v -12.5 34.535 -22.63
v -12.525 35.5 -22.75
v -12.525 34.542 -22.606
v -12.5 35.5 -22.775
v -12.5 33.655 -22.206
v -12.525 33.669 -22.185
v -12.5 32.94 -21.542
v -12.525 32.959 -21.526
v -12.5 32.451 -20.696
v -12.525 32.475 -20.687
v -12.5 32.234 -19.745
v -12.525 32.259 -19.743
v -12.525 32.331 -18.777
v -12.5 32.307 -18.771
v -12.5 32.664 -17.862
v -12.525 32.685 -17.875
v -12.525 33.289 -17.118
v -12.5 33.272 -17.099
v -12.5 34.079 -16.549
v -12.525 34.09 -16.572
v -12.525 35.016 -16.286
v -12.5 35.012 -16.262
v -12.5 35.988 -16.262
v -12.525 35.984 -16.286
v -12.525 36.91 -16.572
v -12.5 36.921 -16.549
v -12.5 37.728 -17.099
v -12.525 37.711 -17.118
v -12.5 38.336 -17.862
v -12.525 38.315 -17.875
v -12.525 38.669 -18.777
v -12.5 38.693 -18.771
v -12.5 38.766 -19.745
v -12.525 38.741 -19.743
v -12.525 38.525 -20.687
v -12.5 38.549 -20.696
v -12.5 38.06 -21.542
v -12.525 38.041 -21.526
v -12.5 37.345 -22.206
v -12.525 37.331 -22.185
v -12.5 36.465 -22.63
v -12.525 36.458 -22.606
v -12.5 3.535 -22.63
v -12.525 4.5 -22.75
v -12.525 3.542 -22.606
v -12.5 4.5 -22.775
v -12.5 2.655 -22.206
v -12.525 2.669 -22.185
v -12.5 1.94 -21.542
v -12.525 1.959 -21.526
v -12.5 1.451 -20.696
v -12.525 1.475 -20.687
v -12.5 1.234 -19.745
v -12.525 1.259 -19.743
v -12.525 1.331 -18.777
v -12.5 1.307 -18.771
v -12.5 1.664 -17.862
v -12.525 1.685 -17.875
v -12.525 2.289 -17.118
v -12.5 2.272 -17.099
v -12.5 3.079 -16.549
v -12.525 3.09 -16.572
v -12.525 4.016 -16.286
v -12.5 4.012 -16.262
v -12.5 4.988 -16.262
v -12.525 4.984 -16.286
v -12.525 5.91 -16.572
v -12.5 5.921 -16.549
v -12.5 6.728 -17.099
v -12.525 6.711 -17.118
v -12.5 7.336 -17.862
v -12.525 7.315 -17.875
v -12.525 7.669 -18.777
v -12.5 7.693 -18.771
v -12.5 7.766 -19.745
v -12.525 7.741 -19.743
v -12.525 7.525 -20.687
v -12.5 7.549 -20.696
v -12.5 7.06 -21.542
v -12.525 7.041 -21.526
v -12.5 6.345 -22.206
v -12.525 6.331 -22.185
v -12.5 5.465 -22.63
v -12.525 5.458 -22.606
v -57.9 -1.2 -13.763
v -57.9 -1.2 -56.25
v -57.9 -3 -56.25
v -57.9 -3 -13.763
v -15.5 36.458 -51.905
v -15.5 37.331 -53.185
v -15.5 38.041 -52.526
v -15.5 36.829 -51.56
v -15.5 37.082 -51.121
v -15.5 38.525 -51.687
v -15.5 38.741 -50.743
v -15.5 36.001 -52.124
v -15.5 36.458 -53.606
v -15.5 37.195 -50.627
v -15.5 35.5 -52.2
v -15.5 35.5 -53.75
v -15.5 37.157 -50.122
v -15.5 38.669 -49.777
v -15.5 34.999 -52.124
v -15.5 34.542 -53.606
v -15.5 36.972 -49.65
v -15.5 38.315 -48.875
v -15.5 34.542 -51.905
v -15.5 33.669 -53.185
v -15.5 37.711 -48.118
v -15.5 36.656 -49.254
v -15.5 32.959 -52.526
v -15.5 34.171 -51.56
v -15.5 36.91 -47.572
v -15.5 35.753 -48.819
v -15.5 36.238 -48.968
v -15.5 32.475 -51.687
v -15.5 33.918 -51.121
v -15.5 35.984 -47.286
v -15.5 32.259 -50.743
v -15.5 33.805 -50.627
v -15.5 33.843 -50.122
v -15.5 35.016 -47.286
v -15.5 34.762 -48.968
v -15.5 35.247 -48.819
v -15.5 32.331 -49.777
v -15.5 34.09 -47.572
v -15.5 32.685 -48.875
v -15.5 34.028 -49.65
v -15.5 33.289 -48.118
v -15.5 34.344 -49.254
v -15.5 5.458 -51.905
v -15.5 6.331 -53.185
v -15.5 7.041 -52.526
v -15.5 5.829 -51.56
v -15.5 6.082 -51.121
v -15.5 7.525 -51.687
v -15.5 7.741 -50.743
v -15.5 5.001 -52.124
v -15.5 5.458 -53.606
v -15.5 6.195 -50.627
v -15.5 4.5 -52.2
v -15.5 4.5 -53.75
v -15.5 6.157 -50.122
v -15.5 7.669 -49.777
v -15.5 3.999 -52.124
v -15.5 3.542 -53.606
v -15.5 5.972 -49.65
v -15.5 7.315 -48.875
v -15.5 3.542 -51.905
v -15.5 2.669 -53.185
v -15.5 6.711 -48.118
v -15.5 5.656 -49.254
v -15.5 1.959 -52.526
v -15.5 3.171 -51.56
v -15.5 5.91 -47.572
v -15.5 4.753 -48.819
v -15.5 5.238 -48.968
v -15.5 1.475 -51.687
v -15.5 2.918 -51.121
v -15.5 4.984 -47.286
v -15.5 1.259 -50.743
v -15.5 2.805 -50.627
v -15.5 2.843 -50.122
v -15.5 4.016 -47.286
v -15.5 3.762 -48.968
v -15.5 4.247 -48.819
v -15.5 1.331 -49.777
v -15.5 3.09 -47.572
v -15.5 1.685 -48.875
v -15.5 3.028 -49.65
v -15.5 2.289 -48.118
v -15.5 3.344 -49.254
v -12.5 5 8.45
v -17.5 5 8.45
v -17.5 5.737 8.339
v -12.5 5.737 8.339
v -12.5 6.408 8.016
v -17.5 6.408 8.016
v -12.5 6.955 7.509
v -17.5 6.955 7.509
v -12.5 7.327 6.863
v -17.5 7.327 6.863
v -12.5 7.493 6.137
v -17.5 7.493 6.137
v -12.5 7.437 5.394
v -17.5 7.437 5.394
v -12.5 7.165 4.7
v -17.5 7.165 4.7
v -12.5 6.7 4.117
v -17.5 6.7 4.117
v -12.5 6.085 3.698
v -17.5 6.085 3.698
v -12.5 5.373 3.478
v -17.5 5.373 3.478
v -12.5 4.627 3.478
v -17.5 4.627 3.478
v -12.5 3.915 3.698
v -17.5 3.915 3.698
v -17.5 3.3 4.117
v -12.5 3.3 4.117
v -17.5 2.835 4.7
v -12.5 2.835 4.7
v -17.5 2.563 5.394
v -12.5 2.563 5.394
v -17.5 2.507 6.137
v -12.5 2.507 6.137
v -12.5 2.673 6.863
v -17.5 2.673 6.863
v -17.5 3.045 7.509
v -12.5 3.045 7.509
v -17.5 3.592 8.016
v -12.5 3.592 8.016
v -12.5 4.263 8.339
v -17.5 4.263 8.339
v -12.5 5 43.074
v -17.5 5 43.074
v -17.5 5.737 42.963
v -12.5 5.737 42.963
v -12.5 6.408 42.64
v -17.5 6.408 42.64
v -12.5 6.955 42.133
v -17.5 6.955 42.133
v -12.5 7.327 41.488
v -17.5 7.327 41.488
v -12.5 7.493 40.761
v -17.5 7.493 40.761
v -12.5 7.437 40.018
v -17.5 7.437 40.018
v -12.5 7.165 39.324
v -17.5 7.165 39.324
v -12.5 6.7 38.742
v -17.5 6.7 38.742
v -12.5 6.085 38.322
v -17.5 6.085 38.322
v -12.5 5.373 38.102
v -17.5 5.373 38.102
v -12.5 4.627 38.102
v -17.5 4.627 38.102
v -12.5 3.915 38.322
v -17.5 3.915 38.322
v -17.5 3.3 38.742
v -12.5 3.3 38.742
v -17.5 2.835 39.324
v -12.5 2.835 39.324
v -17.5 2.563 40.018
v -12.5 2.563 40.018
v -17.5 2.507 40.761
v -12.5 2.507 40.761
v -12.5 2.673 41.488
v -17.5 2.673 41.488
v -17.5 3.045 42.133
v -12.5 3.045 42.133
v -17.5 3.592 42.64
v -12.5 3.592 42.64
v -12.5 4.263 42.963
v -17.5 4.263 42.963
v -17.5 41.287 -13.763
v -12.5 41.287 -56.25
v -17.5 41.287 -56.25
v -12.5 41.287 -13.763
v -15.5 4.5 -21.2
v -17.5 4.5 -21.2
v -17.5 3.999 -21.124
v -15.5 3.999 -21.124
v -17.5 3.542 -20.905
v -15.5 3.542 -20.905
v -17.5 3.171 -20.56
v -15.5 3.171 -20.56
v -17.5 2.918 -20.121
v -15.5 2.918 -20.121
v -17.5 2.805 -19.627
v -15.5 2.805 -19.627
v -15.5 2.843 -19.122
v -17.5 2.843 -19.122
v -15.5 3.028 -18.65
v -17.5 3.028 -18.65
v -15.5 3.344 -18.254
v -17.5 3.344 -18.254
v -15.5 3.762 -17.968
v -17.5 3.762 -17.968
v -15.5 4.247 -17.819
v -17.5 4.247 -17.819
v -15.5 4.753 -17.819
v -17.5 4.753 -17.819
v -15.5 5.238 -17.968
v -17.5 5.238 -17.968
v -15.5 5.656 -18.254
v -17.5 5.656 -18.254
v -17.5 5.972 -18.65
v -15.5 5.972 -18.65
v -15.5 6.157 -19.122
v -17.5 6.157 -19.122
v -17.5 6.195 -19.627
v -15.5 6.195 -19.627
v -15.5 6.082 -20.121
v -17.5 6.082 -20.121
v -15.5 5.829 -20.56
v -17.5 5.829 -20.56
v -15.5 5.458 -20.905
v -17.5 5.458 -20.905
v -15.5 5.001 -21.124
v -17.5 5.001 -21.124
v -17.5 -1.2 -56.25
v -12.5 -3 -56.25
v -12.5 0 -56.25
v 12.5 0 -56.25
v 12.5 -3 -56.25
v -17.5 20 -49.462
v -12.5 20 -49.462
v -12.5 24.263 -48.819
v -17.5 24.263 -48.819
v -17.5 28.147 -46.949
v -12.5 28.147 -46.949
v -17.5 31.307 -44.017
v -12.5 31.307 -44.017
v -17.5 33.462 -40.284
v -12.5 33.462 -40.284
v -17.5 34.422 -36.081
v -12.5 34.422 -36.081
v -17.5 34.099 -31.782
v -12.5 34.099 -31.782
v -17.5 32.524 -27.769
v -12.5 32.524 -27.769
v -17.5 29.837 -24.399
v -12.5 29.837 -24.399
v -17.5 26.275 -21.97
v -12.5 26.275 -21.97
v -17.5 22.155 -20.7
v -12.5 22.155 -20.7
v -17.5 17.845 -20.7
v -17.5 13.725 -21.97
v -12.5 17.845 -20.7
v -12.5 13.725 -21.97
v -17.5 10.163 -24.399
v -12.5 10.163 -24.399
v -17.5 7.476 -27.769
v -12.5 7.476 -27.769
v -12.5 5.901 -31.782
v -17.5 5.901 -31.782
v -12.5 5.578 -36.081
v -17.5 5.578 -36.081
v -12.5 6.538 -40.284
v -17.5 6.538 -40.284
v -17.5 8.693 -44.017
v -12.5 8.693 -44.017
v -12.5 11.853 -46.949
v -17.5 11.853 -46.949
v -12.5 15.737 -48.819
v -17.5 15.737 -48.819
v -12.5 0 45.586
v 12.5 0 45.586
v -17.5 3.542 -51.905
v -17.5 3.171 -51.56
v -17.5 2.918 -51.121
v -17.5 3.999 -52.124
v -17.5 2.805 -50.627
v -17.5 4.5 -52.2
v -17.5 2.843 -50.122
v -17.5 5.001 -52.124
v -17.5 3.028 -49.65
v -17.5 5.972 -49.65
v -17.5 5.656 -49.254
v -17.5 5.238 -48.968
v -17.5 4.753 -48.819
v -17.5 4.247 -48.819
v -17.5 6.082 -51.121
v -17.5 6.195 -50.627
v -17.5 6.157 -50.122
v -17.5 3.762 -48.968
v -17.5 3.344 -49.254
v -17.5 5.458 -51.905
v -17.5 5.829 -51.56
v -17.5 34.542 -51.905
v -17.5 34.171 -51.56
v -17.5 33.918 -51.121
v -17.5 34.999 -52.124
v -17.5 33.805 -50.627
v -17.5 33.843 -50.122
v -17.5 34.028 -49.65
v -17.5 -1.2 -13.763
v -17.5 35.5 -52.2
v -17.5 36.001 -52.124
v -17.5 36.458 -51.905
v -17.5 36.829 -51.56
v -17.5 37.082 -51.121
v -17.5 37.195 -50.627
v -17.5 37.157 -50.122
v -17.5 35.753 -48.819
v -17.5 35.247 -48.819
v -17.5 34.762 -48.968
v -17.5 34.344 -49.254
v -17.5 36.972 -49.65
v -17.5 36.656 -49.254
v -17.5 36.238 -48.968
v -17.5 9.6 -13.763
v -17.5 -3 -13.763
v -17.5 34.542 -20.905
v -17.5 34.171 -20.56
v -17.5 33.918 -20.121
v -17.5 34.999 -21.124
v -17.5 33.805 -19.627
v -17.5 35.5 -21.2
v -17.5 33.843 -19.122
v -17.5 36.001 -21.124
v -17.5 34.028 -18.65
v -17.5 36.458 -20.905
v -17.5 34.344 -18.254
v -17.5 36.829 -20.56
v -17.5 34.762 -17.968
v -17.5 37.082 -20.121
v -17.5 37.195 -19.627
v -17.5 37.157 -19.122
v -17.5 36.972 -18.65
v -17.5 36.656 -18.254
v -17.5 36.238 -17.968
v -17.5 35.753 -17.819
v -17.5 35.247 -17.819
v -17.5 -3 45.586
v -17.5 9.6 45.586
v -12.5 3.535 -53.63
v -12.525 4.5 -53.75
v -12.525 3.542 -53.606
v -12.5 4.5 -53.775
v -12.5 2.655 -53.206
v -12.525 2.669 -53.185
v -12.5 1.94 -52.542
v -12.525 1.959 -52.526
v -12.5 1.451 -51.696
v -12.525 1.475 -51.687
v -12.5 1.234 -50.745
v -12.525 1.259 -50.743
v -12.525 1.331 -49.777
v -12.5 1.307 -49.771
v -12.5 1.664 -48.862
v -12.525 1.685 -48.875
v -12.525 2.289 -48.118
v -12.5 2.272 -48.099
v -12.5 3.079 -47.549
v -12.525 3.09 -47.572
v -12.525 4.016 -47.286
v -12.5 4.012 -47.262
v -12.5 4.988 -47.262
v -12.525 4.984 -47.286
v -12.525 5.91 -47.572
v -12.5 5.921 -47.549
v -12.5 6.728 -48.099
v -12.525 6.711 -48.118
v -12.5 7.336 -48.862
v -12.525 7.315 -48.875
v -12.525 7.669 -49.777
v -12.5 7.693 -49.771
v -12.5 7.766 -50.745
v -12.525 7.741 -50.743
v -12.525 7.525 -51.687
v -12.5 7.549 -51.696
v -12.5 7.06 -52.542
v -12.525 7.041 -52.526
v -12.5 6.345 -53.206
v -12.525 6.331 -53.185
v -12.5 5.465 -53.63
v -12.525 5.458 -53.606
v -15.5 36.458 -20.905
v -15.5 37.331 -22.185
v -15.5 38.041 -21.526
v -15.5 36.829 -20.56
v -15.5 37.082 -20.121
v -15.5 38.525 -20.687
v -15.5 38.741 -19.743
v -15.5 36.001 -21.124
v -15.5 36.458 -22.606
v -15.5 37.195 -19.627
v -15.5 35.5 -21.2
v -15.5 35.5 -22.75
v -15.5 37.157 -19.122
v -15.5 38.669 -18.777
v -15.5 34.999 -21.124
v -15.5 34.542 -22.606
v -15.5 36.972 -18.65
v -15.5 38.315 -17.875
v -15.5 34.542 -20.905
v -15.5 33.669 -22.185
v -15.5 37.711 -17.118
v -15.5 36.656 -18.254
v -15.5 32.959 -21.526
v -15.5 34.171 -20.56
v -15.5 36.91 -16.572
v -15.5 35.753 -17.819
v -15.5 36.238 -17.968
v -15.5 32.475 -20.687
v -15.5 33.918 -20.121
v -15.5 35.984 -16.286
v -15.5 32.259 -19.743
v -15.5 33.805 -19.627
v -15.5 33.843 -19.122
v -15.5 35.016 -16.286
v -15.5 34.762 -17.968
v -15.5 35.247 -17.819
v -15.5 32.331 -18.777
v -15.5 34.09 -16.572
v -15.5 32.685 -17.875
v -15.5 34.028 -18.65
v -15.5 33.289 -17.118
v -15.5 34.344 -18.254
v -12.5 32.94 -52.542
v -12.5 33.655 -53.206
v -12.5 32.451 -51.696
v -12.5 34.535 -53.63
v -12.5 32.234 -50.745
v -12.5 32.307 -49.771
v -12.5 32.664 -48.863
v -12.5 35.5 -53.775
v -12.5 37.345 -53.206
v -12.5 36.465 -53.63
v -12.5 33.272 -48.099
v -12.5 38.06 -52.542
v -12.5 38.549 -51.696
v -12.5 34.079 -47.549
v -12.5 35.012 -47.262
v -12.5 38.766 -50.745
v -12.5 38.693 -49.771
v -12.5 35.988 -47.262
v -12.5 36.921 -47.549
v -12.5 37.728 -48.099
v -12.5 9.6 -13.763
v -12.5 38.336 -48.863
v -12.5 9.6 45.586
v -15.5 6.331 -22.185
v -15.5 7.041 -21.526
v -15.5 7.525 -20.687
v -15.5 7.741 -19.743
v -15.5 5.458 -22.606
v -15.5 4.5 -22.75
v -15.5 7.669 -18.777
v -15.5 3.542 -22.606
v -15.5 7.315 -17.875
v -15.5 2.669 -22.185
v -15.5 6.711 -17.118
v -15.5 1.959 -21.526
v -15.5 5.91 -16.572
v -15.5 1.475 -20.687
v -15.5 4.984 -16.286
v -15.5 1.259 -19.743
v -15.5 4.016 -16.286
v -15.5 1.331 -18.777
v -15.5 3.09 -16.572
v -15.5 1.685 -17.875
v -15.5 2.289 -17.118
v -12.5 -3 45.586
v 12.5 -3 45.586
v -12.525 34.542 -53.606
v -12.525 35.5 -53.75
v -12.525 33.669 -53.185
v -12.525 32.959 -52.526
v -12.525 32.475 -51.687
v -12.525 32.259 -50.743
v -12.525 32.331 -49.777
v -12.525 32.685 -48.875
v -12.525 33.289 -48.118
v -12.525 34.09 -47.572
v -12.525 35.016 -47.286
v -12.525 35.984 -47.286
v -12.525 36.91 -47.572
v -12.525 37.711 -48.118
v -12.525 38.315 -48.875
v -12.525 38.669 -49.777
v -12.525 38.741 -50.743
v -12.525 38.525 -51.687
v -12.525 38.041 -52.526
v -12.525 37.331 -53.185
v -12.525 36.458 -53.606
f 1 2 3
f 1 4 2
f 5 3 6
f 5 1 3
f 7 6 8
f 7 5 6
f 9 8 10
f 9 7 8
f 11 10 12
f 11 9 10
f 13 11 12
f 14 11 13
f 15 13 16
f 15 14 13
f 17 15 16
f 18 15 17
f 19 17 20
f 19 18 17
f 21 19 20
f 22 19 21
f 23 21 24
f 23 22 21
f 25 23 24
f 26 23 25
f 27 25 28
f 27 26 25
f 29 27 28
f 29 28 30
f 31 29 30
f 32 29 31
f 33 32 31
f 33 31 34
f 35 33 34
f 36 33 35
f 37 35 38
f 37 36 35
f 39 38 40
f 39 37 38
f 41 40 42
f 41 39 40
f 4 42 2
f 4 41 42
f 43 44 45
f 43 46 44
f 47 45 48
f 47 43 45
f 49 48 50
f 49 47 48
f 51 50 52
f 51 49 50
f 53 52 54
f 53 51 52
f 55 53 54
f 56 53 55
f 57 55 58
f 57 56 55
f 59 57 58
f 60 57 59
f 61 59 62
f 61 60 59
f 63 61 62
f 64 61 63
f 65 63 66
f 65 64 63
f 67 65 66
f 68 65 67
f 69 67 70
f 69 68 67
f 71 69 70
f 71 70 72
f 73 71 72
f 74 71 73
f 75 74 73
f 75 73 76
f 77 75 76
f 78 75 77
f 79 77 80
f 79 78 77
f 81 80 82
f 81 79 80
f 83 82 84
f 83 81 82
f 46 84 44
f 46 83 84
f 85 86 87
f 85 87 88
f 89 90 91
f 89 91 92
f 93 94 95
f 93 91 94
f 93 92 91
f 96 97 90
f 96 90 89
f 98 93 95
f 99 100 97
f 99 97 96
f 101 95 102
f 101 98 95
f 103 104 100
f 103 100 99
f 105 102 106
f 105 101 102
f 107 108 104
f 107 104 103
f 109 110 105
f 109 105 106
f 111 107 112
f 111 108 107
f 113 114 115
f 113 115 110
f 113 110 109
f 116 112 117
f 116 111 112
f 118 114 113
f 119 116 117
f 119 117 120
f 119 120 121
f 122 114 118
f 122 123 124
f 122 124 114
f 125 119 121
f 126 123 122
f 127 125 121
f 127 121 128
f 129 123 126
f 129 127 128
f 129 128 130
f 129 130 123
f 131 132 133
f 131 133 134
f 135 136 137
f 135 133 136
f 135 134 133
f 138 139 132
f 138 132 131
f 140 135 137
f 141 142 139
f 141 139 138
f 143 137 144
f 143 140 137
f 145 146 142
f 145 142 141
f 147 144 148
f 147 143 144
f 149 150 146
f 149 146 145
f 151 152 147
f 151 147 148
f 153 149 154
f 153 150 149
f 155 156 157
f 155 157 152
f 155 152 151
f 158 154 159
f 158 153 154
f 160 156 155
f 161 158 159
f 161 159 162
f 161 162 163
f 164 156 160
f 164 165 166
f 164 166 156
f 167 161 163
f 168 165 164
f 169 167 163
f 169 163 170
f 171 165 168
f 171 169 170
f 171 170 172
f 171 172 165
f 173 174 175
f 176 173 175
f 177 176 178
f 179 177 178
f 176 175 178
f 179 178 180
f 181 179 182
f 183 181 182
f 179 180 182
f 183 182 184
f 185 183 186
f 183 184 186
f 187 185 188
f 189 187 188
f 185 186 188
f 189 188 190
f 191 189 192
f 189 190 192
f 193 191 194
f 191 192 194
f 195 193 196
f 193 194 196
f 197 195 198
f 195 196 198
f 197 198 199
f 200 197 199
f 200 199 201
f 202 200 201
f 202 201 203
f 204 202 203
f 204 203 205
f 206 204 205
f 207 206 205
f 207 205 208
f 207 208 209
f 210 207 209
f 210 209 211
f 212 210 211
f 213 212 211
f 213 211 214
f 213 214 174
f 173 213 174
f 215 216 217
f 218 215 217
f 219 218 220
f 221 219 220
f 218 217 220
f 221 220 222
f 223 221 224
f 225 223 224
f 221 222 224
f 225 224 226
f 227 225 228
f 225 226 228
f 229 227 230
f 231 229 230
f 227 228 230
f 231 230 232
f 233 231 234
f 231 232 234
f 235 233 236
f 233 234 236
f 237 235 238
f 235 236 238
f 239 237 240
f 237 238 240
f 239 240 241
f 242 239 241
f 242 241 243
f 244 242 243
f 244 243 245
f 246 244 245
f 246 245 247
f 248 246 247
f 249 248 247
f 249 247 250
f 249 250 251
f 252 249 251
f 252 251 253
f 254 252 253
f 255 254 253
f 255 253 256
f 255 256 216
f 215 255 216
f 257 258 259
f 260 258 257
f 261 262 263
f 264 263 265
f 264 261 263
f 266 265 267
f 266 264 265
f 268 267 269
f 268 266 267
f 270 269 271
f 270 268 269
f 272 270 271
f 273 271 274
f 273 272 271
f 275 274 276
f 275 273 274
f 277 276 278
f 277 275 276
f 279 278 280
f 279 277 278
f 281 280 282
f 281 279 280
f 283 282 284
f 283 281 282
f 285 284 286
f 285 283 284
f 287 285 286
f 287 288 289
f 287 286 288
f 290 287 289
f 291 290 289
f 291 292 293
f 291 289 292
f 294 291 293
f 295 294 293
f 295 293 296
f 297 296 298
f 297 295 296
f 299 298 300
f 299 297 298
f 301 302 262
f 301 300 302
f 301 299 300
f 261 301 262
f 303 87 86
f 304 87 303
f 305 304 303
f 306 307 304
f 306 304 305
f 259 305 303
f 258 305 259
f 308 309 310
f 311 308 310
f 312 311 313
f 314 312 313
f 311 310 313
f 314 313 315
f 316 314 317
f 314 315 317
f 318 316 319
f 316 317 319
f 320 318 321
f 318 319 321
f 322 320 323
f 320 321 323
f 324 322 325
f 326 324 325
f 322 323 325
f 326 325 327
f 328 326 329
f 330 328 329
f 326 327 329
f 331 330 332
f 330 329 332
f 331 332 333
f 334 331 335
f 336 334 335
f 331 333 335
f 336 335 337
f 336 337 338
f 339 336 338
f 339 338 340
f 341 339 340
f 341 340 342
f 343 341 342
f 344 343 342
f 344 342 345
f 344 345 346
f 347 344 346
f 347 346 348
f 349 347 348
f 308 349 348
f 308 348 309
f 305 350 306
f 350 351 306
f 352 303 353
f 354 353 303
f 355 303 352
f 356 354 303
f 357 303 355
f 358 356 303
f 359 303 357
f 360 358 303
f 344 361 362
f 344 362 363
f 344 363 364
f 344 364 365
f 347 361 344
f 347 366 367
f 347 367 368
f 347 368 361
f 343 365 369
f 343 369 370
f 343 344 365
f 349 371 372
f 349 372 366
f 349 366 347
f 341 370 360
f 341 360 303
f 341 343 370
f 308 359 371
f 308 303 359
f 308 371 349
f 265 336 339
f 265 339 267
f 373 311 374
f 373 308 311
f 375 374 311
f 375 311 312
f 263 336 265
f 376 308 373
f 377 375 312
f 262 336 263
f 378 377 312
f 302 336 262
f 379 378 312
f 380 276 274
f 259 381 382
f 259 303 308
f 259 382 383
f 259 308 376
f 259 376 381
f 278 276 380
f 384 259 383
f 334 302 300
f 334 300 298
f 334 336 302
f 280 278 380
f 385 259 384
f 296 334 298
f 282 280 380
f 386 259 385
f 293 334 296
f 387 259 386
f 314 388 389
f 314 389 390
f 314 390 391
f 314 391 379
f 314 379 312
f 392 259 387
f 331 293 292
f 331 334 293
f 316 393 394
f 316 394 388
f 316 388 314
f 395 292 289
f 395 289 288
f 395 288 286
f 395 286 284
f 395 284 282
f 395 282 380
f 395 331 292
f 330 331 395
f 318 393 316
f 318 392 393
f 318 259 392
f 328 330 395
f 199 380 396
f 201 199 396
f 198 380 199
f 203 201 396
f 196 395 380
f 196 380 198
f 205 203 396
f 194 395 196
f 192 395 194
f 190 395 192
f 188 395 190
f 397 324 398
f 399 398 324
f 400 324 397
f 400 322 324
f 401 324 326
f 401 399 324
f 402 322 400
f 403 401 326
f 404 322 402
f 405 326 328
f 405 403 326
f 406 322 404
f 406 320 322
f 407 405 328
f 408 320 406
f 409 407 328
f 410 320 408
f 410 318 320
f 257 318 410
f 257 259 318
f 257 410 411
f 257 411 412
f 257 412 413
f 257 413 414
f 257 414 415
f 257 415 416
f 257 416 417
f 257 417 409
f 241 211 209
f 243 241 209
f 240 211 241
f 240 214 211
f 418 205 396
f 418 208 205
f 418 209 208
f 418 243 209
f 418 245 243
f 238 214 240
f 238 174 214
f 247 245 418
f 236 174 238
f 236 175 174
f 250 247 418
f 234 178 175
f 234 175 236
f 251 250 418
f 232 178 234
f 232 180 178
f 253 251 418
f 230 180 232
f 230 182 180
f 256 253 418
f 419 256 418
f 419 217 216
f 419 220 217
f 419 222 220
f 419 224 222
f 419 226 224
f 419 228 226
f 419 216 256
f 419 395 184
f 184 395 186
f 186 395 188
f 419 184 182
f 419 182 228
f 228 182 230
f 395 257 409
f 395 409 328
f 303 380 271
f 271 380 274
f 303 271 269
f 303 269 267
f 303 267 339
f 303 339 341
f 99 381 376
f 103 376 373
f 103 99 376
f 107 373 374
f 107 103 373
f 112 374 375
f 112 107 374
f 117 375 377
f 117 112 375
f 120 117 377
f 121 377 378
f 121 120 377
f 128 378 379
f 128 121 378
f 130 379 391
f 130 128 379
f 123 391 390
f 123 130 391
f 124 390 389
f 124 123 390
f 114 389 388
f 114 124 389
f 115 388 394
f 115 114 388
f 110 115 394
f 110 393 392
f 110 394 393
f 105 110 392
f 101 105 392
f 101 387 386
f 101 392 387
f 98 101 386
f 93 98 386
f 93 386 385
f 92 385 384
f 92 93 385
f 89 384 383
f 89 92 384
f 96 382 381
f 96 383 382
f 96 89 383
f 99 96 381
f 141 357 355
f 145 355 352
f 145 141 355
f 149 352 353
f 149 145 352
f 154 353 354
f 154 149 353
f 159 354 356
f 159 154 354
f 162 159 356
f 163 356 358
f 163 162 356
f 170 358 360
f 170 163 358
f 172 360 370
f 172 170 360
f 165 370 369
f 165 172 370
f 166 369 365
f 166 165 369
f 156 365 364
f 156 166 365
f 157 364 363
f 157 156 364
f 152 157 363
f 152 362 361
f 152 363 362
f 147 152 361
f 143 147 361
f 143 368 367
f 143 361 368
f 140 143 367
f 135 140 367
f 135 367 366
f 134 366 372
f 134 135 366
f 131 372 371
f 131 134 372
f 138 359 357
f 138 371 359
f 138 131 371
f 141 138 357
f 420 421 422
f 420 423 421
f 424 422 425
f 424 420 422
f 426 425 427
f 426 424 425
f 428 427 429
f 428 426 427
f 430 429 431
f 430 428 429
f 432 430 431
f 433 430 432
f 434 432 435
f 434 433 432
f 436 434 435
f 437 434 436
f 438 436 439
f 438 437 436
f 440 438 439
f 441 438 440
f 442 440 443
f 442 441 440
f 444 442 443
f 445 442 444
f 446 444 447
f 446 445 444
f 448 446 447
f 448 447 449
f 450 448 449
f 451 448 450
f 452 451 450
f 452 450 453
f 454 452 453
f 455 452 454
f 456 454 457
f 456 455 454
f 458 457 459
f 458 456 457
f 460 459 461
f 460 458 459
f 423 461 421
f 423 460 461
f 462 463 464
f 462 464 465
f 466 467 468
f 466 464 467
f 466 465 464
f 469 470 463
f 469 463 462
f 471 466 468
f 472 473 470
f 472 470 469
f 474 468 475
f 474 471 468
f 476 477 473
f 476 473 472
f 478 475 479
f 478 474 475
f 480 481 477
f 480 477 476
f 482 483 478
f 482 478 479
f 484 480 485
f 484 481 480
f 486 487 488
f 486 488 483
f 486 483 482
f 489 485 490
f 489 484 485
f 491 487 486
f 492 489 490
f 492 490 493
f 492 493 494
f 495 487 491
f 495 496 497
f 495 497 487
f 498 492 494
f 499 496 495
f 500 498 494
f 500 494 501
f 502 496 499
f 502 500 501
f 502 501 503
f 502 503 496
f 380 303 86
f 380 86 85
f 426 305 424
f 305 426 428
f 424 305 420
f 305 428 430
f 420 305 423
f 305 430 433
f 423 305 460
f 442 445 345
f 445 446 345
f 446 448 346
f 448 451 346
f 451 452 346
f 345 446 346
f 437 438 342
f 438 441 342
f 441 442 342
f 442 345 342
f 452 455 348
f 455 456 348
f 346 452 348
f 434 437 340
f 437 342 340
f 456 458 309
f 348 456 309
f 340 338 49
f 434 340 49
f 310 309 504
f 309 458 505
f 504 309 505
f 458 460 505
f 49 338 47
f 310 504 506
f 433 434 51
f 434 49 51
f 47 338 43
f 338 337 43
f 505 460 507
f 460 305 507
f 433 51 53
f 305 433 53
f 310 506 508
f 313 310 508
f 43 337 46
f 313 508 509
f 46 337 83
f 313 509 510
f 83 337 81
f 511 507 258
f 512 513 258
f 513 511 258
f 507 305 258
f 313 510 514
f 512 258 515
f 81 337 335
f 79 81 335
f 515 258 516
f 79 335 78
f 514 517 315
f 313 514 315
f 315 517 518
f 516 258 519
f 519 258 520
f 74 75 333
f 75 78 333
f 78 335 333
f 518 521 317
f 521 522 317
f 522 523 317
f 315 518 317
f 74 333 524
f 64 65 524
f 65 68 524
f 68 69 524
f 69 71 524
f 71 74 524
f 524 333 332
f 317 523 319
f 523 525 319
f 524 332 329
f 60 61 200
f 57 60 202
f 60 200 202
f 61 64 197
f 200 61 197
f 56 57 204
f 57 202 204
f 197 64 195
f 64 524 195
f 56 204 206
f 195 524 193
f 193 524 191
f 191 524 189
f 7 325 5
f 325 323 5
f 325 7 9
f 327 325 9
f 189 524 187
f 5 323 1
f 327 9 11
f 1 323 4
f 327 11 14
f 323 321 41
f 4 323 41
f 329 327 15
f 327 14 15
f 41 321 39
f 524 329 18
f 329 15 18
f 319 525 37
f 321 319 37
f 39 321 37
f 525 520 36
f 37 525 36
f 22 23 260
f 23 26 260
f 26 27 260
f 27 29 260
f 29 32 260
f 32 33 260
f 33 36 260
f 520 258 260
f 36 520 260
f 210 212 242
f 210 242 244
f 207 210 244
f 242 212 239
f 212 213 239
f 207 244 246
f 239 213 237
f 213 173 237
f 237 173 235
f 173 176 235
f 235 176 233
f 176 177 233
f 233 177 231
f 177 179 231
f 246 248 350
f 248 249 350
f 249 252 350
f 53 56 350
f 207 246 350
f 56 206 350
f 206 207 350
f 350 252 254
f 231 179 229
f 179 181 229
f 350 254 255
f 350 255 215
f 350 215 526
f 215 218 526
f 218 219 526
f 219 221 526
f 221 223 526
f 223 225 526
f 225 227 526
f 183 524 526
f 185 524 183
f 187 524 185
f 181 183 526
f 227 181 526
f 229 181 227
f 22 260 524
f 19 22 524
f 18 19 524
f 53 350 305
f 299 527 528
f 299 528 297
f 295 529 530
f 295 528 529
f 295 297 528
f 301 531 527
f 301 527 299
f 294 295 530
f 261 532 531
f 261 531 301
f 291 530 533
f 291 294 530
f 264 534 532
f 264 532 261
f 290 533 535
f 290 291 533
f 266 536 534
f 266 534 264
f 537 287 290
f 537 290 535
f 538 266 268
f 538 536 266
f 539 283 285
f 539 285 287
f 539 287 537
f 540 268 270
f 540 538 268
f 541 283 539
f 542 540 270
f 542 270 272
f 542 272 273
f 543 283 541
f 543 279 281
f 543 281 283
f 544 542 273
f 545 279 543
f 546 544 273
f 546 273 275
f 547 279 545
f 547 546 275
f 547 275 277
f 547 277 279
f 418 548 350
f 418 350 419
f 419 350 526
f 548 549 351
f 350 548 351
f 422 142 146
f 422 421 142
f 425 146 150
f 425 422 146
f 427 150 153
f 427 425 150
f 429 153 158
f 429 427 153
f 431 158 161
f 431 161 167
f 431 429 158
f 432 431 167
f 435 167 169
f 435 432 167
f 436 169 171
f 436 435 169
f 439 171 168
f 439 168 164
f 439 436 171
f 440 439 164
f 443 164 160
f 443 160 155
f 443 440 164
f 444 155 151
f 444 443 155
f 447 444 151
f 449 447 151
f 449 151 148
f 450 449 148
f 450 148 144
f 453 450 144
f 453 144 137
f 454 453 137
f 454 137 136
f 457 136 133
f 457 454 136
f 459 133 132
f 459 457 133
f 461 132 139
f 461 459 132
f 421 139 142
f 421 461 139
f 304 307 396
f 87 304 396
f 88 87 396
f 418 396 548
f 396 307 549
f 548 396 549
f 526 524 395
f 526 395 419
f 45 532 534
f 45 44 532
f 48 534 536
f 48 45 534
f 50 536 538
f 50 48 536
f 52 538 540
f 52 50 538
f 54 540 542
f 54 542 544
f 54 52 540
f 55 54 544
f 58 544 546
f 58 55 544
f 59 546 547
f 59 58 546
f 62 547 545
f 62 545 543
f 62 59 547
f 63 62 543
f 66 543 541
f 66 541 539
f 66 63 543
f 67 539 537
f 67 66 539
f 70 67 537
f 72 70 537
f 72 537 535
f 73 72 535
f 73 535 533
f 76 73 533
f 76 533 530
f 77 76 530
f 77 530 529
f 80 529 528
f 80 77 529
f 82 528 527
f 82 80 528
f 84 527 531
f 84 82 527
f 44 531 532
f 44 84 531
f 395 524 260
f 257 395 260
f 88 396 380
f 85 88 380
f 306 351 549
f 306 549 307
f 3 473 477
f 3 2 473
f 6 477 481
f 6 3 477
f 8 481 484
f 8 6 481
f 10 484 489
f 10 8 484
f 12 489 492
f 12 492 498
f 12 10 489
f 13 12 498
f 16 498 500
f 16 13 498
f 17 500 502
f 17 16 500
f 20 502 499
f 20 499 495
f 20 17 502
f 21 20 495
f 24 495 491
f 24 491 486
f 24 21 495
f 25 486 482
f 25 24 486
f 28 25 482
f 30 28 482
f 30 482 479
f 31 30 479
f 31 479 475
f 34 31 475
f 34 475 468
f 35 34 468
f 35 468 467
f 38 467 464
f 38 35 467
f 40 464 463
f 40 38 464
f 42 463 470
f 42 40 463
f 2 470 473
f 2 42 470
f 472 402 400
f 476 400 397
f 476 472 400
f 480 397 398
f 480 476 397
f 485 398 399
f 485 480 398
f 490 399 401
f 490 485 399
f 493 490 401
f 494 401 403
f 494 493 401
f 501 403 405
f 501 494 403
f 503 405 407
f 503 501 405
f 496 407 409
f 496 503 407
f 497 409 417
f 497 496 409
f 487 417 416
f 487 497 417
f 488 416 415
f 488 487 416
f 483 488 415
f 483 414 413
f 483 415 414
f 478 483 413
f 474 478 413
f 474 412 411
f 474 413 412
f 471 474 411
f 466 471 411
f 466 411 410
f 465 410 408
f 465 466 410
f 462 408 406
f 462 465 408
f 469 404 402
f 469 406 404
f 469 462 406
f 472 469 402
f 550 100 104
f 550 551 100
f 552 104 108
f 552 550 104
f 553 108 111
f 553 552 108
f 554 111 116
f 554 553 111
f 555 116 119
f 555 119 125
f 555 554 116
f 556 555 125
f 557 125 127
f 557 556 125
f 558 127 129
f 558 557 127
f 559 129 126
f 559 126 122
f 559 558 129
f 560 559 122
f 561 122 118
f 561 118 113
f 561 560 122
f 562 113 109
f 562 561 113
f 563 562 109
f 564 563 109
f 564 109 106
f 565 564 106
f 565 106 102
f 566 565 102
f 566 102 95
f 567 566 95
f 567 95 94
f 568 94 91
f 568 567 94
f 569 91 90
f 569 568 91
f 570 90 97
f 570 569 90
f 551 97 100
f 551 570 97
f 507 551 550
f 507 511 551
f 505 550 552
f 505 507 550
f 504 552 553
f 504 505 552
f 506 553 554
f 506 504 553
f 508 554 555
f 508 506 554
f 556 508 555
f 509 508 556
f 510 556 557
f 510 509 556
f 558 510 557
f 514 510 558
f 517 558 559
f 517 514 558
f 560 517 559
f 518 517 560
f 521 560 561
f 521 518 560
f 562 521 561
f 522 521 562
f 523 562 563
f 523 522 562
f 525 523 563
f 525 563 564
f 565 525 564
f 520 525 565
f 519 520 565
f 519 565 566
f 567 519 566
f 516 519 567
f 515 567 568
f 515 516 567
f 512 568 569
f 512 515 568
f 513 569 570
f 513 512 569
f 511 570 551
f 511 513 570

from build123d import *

# Parameters (mm, degrees)
SKETCH1_W                     = 101.835629046
SKETCH1_H                     = 3
BOSS_EXTRUDE1_DEPTH           = 12.5
SKETCH2_W                     = 42.486551299
SKETCH2_H                     = 1.8
BOSS_EXTRUDE2_DEPTH           = 45.4
SKETCH3_W                     = 42.486551299
SKETCH3_H                     = 42.486551299
BOSS_EXTRUDE3_DEPTH           = 5
CBORE_FOR_M3_SHCS2_AT_2_COUNT = 2
CBORE_FOR_M3_SHCS2_AT_2_PITCH = 31
CBORE_FOR_M3_SHCS2_AT_3_COUNT = 2
CBORE_FOR_M3_SHCS2_AT_3_PITCH = 43.840620434
CBORE_FOR_M3_SHCS2_AT_4_COUNT = 2
CBORE_FOR_M3_SHCS2_AT_4_PITCH = 31
SKETCH9_R                     = 14.462
CUT_EXTRUDE1_DEPTH            = 10
SKETCH10_W                    = 59.349077747
SKETCH10_H                    = 12.6
BOSS_EXTRUDE4_DEPTH           = 5
SKETCH11_R                    = 2.5
CUT_EXTRUDE2_DEPTH            = 10


with BuildPart() as part:
    # Sketch1 → Boss-Extrude1 (new, symmetric)
    with BuildSketch(Plane(origin=(0, 0, 0), x_dir=(0, 0, -1), z_dir=(1, 0, 0))):
        with Locations((5.332185477, -1.5)):
            Rectangle(SKETCH1_W, SKETCH1_H)
    extrude(amount=BOSS_EXTRUDE1_DEPTH, both=True)

    # Sketch2 → Boss-Extrude2 (add)
    with BuildSketch(Plane.ZY.offset(12.5)):
        with Locations((-35.006724351, -2.1)):
            Rectangle(SKETCH2_W, SKETCH2_H)
    extrude(amount=BOSS_EXTRUDE2_DEPTH)

    # Sketch3 → Boss-Extrude3 (add)
    with BuildSketch(Plane.ZY.offset(12.5)):
        with Locations((-35.006724351, 20.043275649)):
            Rectangle(SKETCH3_W, SKETCH3_H)
    extrude(amount=BOSS_EXTRUDE3_DEPTH)

    # Sketch8 → CBORE for M3 SHCS2 (revolve, cut)
    with BuildSketch(Plane(origin=(-12.5, 4.5, -19.5), x_dir=(0, 0, -1), z_dir=(0, 1, 0))):
        Polygon((0, 0), (0, 45.4), (1.7, 45.4), (1.7, 3), (3.25, 3), (3.25, 0.025), (3.275, 0), align=None)
    cbore_for_m3_shcs2 = revolve(axis=Axis((-6.15, 4.5, -19.5), (-1, 0, 0)), mode=Mode.SUBTRACT)

    # CBORE for M3 SHCS2 at 2: CBORE for M3 SHCS2 ×2
    with Locations(*[(0, 0, -i * CBORE_FOR_M3_SHCS2_AT_2_PITCH) for i in range(1, CBORE_FOR_M3_SHCS2_AT_2_COUNT)]):
        add(cbore_for_m3_shcs2, mode=Mode.SUBTRACT)

    # CBORE for M3 SHCS2 at 3: CBORE for M3 SHCS2 ×2
    with Locations(*[Vector(0, 0.7071067811865476, -0.7071067811865475) * (i * CBORE_FOR_M3_SHCS2_AT_3_PITCH) for i in range(1, CBORE_FOR_M3_SHCS2_AT_3_COUNT)]):
        add(cbore_for_m3_shcs2, mode=Mode.SUBTRACT)

    # CBORE for M3 SHCS2 at 4: CBORE for M3 SHCS2 ×2
    with Locations(*[(0, i * CBORE_FOR_M3_SHCS2_AT_4_PITCH, 0) for i in range(1, CBORE_FOR_M3_SHCS2_AT_4_COUNT)]):
        add(cbore_for_m3_shcs2, mode=Mode.SUBTRACT)

    # Sketch9 → Cut-Extrude1 (cut)
    with BuildSketch(Plane(origin=(-12.5, 0, 0), x_dir=(0, 0, -1), z_dir=(1, 0, 0))):
        with Locations((35, 20)):
            Circle(SKETCH9_R)
    extrude(amount=-CUT_EXTRUDE1_DEPTH, mode=Mode.SUBTRACT)

    # Sketch10 → Boss-Extrude4 (add)
    with BuildSketch(Plane.ZY.offset(12.5)):
        with Locations((15.911090172, 3.3)):
            Rectangle(SKETCH10_W, SKETCH10_H)
    extrude(amount=BOSS_EXTRUDE4_DEPTH)

    # Sketch11 → Cut-Extrude2 (cut)
    with BuildSketch(Plane.ZY.offset(17.5)):
        with Locations((5.95, 5)):
            Circle(SKETCH11_R)
        with Locations((40.574170501, 5)):
            Circle(SKETCH11_R)
    extrude(amount=-CUT_EXTRUDE2_DEPTH, mode=Mode.SUBTRACT)


solid = part.part
